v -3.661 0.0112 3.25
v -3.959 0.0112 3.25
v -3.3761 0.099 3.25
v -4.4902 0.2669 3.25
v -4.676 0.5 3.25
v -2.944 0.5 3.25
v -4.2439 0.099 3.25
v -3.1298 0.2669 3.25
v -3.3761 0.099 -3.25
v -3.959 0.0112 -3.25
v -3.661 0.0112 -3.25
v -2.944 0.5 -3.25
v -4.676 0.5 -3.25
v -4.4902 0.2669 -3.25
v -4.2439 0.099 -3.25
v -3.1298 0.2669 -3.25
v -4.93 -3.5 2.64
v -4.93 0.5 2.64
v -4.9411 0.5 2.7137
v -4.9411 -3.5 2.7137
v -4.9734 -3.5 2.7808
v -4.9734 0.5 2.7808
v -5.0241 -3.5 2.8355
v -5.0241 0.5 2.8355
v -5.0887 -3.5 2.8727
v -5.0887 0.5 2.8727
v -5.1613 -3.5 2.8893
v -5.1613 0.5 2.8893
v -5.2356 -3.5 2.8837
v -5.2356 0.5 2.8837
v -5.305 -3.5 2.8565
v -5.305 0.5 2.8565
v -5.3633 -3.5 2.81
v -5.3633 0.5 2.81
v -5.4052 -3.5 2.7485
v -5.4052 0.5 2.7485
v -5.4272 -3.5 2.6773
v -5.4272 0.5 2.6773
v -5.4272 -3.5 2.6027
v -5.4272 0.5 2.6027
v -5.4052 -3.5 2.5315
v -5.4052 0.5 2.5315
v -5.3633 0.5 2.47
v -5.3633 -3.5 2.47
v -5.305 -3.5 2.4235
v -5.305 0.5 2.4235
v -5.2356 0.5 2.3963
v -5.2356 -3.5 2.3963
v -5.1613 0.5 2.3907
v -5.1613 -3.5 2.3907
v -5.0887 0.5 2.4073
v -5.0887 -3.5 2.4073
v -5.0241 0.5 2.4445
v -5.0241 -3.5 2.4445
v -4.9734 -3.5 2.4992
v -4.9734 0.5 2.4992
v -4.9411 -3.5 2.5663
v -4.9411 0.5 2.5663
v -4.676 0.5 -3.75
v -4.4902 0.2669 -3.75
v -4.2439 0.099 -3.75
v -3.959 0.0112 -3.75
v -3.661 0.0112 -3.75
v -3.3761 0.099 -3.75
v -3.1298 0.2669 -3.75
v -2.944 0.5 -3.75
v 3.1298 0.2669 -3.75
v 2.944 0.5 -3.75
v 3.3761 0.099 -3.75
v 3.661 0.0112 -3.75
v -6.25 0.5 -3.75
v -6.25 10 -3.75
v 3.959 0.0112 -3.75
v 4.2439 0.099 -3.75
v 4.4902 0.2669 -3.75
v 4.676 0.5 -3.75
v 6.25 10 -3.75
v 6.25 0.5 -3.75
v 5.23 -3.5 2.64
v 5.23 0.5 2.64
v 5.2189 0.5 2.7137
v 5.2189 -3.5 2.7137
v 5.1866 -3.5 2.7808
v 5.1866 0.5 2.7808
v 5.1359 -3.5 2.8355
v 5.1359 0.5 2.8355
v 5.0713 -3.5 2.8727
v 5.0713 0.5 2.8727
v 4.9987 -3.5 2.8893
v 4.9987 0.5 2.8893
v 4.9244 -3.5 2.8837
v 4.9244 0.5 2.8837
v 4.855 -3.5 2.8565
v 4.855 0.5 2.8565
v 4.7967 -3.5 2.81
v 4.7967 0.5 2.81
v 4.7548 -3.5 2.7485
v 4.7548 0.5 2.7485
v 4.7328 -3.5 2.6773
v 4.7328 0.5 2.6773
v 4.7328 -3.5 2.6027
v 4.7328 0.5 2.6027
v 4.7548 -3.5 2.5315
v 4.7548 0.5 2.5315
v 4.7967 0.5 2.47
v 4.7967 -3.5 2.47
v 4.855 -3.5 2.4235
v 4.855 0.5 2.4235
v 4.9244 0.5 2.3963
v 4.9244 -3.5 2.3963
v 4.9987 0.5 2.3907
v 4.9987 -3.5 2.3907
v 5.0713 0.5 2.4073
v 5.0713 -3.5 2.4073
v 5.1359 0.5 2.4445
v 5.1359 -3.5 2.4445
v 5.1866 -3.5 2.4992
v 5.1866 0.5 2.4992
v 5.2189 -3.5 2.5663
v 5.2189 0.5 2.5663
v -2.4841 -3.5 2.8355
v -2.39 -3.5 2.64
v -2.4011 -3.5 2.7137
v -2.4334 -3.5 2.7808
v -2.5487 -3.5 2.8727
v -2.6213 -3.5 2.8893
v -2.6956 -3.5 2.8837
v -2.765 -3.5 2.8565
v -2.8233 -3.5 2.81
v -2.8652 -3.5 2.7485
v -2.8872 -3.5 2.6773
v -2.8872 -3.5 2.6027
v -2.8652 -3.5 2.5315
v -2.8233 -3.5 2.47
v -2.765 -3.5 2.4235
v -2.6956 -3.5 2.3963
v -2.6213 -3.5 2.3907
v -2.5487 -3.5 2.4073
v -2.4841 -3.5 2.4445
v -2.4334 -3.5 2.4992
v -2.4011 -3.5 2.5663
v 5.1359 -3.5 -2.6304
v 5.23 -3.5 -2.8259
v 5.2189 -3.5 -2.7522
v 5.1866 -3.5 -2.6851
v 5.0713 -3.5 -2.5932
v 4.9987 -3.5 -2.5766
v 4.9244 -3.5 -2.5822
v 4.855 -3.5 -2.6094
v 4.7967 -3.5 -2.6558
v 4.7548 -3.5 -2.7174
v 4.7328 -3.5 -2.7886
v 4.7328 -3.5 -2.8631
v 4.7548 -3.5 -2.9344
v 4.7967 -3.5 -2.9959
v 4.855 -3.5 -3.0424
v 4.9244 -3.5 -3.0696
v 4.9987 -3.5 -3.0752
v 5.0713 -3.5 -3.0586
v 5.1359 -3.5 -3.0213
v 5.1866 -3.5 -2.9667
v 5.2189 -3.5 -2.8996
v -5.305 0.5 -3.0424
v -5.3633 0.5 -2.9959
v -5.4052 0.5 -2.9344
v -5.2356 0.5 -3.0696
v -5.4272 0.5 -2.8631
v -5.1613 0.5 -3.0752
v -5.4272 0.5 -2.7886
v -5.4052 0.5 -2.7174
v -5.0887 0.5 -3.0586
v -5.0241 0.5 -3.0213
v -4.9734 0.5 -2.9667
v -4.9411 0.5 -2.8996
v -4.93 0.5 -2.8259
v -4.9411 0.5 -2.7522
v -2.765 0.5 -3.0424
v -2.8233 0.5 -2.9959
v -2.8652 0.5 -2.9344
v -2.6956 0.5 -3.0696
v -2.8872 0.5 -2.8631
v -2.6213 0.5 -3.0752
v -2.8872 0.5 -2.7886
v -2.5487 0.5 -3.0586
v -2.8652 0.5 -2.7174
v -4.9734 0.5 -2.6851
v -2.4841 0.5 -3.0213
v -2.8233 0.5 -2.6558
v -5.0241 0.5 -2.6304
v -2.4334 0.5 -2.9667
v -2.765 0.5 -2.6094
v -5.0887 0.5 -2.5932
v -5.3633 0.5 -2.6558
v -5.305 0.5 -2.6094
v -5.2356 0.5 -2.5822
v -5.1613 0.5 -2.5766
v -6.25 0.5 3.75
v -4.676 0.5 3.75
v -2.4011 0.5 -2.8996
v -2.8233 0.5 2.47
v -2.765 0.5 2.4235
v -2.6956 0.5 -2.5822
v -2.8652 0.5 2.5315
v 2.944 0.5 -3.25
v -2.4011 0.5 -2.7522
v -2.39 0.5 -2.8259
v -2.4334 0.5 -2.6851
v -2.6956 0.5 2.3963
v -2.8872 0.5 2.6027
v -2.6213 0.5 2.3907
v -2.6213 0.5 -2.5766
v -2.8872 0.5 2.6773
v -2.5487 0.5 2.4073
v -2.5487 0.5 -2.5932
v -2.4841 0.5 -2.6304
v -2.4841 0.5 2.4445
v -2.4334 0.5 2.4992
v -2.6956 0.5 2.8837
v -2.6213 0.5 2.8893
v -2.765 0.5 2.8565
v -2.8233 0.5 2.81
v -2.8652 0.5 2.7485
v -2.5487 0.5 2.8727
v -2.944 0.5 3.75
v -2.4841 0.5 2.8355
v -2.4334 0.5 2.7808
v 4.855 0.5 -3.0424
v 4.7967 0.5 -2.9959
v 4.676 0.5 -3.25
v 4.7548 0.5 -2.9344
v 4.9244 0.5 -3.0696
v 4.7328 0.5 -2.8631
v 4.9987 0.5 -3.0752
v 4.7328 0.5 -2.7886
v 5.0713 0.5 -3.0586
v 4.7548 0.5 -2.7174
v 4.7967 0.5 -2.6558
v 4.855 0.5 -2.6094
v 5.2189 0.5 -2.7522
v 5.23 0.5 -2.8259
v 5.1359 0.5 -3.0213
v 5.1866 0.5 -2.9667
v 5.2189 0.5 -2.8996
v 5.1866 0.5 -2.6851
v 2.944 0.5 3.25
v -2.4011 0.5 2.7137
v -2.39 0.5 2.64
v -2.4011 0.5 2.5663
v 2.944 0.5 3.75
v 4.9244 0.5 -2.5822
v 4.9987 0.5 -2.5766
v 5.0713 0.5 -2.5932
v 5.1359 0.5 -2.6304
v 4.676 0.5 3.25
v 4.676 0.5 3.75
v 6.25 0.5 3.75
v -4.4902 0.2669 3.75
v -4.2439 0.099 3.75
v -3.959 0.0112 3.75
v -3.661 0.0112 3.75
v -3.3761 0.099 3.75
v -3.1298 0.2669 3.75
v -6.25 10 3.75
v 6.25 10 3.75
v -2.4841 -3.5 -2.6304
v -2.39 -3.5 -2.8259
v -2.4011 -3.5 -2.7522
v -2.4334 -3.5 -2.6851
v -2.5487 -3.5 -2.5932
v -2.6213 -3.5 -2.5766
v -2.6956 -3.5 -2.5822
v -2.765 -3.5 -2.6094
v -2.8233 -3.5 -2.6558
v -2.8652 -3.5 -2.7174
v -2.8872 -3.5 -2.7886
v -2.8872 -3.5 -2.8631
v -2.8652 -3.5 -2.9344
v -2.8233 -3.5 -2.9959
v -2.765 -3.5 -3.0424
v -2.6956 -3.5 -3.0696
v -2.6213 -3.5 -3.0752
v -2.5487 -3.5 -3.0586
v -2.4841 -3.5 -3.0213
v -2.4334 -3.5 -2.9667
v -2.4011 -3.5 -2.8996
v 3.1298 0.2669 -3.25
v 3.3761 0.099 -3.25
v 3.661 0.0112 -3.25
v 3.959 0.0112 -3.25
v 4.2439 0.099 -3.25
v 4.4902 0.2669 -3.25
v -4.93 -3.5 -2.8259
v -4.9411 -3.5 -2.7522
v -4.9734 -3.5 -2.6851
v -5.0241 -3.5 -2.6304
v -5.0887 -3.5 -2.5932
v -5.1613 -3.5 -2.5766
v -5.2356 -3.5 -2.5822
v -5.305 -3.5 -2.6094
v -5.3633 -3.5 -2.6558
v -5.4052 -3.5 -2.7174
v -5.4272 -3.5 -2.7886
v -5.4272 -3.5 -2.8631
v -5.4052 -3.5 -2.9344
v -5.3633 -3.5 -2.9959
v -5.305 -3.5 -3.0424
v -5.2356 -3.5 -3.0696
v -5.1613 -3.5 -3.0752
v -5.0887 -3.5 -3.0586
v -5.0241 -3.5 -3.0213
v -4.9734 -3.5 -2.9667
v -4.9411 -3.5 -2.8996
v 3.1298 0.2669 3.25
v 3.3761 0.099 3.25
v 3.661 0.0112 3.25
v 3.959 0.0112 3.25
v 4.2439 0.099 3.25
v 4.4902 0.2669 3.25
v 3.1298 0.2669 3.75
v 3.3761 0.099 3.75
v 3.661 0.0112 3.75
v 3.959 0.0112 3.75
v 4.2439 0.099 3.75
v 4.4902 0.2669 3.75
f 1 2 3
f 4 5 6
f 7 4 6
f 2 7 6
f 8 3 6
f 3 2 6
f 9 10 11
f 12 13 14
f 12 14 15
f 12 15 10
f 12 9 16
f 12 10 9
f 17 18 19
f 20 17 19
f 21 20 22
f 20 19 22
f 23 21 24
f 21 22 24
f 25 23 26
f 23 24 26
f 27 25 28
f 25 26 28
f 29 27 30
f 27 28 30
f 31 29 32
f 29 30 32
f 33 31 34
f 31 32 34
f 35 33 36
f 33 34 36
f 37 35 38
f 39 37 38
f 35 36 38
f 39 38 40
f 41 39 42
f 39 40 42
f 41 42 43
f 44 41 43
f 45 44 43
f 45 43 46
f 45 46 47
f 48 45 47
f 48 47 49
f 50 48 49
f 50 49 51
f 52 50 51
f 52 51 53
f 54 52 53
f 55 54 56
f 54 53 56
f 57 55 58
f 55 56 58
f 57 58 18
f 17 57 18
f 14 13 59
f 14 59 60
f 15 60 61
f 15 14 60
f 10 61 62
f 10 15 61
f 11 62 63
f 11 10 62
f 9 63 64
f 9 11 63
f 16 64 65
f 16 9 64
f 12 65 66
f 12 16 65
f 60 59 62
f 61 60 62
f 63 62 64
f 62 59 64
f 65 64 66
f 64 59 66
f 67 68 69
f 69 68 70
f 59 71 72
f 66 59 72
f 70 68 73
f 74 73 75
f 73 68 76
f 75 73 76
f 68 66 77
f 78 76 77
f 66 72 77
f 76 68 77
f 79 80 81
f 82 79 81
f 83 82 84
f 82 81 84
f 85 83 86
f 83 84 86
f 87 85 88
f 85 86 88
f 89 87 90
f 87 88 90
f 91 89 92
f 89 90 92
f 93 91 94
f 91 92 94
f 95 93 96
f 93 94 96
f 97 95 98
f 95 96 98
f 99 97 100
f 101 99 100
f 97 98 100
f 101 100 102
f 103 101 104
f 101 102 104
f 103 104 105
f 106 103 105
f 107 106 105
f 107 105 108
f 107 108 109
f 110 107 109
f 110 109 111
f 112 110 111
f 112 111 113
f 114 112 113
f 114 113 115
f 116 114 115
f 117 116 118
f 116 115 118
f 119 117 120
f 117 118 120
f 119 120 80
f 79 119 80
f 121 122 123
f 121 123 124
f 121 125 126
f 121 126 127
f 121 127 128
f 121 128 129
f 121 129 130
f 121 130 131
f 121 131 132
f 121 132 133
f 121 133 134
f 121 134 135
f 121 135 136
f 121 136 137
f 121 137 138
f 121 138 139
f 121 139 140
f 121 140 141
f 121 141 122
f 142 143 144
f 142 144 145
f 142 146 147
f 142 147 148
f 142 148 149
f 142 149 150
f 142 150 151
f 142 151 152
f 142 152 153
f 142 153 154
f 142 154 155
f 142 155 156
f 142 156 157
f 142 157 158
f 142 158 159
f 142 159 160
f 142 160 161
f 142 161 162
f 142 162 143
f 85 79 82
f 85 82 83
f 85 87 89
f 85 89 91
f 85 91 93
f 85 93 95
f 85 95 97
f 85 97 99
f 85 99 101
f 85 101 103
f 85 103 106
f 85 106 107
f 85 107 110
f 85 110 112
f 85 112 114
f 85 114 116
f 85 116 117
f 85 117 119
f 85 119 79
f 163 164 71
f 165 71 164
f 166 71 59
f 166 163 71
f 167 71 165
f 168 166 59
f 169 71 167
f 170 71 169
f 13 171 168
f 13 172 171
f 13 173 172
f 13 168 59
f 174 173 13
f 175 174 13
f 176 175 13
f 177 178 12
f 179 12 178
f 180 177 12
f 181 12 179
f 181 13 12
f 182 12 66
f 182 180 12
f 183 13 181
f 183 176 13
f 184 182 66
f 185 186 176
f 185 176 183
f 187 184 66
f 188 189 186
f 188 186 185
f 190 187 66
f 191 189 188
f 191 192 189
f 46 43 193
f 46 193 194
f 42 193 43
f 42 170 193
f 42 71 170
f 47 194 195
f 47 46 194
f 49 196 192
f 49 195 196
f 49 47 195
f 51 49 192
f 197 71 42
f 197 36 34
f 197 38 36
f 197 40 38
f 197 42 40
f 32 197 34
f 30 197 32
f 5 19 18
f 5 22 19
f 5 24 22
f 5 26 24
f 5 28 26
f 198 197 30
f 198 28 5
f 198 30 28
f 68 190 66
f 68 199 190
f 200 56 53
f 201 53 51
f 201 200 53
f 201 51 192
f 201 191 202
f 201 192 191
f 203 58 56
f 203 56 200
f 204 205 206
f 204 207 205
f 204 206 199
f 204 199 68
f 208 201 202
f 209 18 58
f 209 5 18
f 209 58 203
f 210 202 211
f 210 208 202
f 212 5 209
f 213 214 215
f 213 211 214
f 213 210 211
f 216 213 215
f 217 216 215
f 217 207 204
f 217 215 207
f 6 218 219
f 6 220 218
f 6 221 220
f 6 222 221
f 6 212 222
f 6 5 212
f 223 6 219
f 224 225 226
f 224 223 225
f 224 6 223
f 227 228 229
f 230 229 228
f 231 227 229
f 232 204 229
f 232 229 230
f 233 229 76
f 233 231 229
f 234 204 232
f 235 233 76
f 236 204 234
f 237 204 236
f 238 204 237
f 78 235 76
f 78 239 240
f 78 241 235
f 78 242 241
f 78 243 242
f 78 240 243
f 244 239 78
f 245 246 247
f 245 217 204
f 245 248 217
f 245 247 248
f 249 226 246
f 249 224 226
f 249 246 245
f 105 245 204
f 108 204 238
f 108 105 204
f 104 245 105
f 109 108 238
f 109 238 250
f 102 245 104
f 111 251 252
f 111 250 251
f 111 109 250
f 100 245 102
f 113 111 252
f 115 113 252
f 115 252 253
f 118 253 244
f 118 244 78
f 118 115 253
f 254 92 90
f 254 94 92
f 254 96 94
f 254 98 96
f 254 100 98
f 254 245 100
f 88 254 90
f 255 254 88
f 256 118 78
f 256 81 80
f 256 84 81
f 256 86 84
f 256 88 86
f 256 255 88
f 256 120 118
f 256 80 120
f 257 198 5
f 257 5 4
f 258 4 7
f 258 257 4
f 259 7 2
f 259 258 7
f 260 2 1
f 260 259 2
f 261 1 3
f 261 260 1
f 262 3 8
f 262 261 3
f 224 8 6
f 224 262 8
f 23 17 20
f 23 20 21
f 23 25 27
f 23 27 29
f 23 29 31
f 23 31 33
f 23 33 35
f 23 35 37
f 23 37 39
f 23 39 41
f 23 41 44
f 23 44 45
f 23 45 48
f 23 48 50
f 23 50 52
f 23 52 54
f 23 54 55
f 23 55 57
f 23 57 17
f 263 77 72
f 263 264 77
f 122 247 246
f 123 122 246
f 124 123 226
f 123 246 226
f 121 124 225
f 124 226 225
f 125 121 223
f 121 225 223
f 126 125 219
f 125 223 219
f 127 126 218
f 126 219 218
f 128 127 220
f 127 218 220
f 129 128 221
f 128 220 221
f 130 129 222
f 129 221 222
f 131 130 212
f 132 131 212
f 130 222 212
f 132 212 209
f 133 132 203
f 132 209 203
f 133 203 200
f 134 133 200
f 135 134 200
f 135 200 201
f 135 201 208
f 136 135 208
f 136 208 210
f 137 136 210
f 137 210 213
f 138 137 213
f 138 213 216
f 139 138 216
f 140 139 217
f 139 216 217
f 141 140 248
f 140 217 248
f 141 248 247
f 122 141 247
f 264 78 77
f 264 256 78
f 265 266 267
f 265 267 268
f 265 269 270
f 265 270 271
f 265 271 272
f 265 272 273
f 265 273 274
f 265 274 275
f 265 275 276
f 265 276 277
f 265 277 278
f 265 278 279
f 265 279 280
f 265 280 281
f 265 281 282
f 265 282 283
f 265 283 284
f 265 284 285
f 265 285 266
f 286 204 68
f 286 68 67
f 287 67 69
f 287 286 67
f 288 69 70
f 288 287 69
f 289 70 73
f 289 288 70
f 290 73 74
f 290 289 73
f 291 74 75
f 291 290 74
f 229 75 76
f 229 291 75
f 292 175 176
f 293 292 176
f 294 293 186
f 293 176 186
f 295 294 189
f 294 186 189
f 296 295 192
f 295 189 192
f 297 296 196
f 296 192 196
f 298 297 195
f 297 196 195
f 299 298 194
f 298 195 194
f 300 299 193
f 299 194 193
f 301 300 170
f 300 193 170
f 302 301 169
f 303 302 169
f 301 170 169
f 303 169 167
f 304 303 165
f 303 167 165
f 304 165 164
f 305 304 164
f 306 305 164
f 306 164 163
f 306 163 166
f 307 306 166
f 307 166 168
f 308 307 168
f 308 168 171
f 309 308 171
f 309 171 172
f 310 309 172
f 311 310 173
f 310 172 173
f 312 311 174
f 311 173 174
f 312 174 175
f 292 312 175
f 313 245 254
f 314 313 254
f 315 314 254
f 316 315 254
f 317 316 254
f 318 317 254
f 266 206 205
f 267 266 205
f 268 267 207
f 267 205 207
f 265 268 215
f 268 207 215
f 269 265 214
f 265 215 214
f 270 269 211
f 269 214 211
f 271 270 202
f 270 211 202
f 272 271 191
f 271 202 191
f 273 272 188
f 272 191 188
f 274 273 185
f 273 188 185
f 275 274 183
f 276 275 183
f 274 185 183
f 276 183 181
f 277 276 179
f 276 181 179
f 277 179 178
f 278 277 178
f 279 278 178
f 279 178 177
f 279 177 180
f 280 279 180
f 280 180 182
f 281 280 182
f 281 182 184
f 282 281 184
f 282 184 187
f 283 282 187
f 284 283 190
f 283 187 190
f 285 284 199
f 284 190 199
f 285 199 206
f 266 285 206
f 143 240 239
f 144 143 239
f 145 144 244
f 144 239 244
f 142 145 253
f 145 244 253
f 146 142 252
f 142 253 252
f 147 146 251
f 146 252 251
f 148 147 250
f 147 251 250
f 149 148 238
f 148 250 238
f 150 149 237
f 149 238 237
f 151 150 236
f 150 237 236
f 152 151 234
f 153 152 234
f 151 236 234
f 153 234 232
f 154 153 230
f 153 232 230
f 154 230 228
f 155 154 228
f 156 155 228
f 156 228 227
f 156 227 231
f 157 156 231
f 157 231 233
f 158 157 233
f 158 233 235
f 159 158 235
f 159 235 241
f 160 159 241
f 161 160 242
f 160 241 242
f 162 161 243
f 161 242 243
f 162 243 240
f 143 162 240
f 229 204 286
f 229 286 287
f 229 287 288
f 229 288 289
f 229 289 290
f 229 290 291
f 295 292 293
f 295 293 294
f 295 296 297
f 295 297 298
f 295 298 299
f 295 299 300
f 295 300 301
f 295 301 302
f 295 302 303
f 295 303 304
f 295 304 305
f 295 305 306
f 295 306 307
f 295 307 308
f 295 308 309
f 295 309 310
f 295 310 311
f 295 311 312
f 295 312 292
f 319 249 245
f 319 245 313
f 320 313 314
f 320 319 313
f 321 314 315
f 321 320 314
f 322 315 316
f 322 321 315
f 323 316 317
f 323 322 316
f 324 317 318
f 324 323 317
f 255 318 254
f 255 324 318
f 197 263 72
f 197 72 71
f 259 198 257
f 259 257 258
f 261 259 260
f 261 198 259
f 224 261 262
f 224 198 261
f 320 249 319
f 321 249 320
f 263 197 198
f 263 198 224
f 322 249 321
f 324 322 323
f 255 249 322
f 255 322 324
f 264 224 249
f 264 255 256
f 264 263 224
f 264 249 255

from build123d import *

# Parameters (mm, degrees)
F1_DEPTH      = 3.75
F1_DEPTH_BACK = 3.75
F2_W          = 12.5
F2_H          = 6.5
F3_DEPTH      = 0.501
F4_R          = 0.25
F5_DEPTH      = 4


with BuildPart() as f1:
    # F0 (on Top) → F1 (new body, two sides)
    with BuildSketch(Plane.XY) as f1_sk:
        with BuildLine():
            Line((6.25, 10), (-6.25, 10))
            Line((-6.25, 10), (-6.25, 0.5))
            Line((-6.25, 0.5), (-4.676025, 0.5))
            ThreePointArc((-4.676025, 0.5), (-3.81, 0), (-2.943975, 0.5))
            Line((-2.943975, 0.5), (2.943975, 0.5))
            ThreePointArc((2.943975, 0.5), (3.81, 0), (4.676025, 0.5))
            Line((4.676025, 0.5), (6.25, 0.5))
            Line((6.25, 0.5), (6.25, 10))
        make_face()
    extrude(amount=F1_DEPTH)
    extrude(f1_sk.sketch, amount=-F1_DEPTH_BACK)

    # F2 (on face) → F3 (cut, through all)
    with BuildSketch(Plane.XZ.offset(-0.5)):
        Rectangle(F2_W, F2_H)
    extrude(amount=F3_DEPTH, mode=Mode.SUBTRACT)

    # F4 (on face) → F5 (join)
    with BuildSketch(Plane.XZ.offset(-0.5)):
        with Locations((-5.18, 2.64)):
            Circle(F4_R)
        with Locations((-2.64, 2.64)):
            Circle(F4_R)
        with Locations((4.98, 2.64)):
            Circle(F4_R)
        with Locations((4.98, -2.825889)):
            Circle(F4_R)
        with Locations((-5.18, -2.825889)):
            Circle(F4_R)
        with Locations((-2.64, -2.825889)):
            Circle(F4_R)
    extrude(amount=F5_DEPTH)


solid = f1.part
